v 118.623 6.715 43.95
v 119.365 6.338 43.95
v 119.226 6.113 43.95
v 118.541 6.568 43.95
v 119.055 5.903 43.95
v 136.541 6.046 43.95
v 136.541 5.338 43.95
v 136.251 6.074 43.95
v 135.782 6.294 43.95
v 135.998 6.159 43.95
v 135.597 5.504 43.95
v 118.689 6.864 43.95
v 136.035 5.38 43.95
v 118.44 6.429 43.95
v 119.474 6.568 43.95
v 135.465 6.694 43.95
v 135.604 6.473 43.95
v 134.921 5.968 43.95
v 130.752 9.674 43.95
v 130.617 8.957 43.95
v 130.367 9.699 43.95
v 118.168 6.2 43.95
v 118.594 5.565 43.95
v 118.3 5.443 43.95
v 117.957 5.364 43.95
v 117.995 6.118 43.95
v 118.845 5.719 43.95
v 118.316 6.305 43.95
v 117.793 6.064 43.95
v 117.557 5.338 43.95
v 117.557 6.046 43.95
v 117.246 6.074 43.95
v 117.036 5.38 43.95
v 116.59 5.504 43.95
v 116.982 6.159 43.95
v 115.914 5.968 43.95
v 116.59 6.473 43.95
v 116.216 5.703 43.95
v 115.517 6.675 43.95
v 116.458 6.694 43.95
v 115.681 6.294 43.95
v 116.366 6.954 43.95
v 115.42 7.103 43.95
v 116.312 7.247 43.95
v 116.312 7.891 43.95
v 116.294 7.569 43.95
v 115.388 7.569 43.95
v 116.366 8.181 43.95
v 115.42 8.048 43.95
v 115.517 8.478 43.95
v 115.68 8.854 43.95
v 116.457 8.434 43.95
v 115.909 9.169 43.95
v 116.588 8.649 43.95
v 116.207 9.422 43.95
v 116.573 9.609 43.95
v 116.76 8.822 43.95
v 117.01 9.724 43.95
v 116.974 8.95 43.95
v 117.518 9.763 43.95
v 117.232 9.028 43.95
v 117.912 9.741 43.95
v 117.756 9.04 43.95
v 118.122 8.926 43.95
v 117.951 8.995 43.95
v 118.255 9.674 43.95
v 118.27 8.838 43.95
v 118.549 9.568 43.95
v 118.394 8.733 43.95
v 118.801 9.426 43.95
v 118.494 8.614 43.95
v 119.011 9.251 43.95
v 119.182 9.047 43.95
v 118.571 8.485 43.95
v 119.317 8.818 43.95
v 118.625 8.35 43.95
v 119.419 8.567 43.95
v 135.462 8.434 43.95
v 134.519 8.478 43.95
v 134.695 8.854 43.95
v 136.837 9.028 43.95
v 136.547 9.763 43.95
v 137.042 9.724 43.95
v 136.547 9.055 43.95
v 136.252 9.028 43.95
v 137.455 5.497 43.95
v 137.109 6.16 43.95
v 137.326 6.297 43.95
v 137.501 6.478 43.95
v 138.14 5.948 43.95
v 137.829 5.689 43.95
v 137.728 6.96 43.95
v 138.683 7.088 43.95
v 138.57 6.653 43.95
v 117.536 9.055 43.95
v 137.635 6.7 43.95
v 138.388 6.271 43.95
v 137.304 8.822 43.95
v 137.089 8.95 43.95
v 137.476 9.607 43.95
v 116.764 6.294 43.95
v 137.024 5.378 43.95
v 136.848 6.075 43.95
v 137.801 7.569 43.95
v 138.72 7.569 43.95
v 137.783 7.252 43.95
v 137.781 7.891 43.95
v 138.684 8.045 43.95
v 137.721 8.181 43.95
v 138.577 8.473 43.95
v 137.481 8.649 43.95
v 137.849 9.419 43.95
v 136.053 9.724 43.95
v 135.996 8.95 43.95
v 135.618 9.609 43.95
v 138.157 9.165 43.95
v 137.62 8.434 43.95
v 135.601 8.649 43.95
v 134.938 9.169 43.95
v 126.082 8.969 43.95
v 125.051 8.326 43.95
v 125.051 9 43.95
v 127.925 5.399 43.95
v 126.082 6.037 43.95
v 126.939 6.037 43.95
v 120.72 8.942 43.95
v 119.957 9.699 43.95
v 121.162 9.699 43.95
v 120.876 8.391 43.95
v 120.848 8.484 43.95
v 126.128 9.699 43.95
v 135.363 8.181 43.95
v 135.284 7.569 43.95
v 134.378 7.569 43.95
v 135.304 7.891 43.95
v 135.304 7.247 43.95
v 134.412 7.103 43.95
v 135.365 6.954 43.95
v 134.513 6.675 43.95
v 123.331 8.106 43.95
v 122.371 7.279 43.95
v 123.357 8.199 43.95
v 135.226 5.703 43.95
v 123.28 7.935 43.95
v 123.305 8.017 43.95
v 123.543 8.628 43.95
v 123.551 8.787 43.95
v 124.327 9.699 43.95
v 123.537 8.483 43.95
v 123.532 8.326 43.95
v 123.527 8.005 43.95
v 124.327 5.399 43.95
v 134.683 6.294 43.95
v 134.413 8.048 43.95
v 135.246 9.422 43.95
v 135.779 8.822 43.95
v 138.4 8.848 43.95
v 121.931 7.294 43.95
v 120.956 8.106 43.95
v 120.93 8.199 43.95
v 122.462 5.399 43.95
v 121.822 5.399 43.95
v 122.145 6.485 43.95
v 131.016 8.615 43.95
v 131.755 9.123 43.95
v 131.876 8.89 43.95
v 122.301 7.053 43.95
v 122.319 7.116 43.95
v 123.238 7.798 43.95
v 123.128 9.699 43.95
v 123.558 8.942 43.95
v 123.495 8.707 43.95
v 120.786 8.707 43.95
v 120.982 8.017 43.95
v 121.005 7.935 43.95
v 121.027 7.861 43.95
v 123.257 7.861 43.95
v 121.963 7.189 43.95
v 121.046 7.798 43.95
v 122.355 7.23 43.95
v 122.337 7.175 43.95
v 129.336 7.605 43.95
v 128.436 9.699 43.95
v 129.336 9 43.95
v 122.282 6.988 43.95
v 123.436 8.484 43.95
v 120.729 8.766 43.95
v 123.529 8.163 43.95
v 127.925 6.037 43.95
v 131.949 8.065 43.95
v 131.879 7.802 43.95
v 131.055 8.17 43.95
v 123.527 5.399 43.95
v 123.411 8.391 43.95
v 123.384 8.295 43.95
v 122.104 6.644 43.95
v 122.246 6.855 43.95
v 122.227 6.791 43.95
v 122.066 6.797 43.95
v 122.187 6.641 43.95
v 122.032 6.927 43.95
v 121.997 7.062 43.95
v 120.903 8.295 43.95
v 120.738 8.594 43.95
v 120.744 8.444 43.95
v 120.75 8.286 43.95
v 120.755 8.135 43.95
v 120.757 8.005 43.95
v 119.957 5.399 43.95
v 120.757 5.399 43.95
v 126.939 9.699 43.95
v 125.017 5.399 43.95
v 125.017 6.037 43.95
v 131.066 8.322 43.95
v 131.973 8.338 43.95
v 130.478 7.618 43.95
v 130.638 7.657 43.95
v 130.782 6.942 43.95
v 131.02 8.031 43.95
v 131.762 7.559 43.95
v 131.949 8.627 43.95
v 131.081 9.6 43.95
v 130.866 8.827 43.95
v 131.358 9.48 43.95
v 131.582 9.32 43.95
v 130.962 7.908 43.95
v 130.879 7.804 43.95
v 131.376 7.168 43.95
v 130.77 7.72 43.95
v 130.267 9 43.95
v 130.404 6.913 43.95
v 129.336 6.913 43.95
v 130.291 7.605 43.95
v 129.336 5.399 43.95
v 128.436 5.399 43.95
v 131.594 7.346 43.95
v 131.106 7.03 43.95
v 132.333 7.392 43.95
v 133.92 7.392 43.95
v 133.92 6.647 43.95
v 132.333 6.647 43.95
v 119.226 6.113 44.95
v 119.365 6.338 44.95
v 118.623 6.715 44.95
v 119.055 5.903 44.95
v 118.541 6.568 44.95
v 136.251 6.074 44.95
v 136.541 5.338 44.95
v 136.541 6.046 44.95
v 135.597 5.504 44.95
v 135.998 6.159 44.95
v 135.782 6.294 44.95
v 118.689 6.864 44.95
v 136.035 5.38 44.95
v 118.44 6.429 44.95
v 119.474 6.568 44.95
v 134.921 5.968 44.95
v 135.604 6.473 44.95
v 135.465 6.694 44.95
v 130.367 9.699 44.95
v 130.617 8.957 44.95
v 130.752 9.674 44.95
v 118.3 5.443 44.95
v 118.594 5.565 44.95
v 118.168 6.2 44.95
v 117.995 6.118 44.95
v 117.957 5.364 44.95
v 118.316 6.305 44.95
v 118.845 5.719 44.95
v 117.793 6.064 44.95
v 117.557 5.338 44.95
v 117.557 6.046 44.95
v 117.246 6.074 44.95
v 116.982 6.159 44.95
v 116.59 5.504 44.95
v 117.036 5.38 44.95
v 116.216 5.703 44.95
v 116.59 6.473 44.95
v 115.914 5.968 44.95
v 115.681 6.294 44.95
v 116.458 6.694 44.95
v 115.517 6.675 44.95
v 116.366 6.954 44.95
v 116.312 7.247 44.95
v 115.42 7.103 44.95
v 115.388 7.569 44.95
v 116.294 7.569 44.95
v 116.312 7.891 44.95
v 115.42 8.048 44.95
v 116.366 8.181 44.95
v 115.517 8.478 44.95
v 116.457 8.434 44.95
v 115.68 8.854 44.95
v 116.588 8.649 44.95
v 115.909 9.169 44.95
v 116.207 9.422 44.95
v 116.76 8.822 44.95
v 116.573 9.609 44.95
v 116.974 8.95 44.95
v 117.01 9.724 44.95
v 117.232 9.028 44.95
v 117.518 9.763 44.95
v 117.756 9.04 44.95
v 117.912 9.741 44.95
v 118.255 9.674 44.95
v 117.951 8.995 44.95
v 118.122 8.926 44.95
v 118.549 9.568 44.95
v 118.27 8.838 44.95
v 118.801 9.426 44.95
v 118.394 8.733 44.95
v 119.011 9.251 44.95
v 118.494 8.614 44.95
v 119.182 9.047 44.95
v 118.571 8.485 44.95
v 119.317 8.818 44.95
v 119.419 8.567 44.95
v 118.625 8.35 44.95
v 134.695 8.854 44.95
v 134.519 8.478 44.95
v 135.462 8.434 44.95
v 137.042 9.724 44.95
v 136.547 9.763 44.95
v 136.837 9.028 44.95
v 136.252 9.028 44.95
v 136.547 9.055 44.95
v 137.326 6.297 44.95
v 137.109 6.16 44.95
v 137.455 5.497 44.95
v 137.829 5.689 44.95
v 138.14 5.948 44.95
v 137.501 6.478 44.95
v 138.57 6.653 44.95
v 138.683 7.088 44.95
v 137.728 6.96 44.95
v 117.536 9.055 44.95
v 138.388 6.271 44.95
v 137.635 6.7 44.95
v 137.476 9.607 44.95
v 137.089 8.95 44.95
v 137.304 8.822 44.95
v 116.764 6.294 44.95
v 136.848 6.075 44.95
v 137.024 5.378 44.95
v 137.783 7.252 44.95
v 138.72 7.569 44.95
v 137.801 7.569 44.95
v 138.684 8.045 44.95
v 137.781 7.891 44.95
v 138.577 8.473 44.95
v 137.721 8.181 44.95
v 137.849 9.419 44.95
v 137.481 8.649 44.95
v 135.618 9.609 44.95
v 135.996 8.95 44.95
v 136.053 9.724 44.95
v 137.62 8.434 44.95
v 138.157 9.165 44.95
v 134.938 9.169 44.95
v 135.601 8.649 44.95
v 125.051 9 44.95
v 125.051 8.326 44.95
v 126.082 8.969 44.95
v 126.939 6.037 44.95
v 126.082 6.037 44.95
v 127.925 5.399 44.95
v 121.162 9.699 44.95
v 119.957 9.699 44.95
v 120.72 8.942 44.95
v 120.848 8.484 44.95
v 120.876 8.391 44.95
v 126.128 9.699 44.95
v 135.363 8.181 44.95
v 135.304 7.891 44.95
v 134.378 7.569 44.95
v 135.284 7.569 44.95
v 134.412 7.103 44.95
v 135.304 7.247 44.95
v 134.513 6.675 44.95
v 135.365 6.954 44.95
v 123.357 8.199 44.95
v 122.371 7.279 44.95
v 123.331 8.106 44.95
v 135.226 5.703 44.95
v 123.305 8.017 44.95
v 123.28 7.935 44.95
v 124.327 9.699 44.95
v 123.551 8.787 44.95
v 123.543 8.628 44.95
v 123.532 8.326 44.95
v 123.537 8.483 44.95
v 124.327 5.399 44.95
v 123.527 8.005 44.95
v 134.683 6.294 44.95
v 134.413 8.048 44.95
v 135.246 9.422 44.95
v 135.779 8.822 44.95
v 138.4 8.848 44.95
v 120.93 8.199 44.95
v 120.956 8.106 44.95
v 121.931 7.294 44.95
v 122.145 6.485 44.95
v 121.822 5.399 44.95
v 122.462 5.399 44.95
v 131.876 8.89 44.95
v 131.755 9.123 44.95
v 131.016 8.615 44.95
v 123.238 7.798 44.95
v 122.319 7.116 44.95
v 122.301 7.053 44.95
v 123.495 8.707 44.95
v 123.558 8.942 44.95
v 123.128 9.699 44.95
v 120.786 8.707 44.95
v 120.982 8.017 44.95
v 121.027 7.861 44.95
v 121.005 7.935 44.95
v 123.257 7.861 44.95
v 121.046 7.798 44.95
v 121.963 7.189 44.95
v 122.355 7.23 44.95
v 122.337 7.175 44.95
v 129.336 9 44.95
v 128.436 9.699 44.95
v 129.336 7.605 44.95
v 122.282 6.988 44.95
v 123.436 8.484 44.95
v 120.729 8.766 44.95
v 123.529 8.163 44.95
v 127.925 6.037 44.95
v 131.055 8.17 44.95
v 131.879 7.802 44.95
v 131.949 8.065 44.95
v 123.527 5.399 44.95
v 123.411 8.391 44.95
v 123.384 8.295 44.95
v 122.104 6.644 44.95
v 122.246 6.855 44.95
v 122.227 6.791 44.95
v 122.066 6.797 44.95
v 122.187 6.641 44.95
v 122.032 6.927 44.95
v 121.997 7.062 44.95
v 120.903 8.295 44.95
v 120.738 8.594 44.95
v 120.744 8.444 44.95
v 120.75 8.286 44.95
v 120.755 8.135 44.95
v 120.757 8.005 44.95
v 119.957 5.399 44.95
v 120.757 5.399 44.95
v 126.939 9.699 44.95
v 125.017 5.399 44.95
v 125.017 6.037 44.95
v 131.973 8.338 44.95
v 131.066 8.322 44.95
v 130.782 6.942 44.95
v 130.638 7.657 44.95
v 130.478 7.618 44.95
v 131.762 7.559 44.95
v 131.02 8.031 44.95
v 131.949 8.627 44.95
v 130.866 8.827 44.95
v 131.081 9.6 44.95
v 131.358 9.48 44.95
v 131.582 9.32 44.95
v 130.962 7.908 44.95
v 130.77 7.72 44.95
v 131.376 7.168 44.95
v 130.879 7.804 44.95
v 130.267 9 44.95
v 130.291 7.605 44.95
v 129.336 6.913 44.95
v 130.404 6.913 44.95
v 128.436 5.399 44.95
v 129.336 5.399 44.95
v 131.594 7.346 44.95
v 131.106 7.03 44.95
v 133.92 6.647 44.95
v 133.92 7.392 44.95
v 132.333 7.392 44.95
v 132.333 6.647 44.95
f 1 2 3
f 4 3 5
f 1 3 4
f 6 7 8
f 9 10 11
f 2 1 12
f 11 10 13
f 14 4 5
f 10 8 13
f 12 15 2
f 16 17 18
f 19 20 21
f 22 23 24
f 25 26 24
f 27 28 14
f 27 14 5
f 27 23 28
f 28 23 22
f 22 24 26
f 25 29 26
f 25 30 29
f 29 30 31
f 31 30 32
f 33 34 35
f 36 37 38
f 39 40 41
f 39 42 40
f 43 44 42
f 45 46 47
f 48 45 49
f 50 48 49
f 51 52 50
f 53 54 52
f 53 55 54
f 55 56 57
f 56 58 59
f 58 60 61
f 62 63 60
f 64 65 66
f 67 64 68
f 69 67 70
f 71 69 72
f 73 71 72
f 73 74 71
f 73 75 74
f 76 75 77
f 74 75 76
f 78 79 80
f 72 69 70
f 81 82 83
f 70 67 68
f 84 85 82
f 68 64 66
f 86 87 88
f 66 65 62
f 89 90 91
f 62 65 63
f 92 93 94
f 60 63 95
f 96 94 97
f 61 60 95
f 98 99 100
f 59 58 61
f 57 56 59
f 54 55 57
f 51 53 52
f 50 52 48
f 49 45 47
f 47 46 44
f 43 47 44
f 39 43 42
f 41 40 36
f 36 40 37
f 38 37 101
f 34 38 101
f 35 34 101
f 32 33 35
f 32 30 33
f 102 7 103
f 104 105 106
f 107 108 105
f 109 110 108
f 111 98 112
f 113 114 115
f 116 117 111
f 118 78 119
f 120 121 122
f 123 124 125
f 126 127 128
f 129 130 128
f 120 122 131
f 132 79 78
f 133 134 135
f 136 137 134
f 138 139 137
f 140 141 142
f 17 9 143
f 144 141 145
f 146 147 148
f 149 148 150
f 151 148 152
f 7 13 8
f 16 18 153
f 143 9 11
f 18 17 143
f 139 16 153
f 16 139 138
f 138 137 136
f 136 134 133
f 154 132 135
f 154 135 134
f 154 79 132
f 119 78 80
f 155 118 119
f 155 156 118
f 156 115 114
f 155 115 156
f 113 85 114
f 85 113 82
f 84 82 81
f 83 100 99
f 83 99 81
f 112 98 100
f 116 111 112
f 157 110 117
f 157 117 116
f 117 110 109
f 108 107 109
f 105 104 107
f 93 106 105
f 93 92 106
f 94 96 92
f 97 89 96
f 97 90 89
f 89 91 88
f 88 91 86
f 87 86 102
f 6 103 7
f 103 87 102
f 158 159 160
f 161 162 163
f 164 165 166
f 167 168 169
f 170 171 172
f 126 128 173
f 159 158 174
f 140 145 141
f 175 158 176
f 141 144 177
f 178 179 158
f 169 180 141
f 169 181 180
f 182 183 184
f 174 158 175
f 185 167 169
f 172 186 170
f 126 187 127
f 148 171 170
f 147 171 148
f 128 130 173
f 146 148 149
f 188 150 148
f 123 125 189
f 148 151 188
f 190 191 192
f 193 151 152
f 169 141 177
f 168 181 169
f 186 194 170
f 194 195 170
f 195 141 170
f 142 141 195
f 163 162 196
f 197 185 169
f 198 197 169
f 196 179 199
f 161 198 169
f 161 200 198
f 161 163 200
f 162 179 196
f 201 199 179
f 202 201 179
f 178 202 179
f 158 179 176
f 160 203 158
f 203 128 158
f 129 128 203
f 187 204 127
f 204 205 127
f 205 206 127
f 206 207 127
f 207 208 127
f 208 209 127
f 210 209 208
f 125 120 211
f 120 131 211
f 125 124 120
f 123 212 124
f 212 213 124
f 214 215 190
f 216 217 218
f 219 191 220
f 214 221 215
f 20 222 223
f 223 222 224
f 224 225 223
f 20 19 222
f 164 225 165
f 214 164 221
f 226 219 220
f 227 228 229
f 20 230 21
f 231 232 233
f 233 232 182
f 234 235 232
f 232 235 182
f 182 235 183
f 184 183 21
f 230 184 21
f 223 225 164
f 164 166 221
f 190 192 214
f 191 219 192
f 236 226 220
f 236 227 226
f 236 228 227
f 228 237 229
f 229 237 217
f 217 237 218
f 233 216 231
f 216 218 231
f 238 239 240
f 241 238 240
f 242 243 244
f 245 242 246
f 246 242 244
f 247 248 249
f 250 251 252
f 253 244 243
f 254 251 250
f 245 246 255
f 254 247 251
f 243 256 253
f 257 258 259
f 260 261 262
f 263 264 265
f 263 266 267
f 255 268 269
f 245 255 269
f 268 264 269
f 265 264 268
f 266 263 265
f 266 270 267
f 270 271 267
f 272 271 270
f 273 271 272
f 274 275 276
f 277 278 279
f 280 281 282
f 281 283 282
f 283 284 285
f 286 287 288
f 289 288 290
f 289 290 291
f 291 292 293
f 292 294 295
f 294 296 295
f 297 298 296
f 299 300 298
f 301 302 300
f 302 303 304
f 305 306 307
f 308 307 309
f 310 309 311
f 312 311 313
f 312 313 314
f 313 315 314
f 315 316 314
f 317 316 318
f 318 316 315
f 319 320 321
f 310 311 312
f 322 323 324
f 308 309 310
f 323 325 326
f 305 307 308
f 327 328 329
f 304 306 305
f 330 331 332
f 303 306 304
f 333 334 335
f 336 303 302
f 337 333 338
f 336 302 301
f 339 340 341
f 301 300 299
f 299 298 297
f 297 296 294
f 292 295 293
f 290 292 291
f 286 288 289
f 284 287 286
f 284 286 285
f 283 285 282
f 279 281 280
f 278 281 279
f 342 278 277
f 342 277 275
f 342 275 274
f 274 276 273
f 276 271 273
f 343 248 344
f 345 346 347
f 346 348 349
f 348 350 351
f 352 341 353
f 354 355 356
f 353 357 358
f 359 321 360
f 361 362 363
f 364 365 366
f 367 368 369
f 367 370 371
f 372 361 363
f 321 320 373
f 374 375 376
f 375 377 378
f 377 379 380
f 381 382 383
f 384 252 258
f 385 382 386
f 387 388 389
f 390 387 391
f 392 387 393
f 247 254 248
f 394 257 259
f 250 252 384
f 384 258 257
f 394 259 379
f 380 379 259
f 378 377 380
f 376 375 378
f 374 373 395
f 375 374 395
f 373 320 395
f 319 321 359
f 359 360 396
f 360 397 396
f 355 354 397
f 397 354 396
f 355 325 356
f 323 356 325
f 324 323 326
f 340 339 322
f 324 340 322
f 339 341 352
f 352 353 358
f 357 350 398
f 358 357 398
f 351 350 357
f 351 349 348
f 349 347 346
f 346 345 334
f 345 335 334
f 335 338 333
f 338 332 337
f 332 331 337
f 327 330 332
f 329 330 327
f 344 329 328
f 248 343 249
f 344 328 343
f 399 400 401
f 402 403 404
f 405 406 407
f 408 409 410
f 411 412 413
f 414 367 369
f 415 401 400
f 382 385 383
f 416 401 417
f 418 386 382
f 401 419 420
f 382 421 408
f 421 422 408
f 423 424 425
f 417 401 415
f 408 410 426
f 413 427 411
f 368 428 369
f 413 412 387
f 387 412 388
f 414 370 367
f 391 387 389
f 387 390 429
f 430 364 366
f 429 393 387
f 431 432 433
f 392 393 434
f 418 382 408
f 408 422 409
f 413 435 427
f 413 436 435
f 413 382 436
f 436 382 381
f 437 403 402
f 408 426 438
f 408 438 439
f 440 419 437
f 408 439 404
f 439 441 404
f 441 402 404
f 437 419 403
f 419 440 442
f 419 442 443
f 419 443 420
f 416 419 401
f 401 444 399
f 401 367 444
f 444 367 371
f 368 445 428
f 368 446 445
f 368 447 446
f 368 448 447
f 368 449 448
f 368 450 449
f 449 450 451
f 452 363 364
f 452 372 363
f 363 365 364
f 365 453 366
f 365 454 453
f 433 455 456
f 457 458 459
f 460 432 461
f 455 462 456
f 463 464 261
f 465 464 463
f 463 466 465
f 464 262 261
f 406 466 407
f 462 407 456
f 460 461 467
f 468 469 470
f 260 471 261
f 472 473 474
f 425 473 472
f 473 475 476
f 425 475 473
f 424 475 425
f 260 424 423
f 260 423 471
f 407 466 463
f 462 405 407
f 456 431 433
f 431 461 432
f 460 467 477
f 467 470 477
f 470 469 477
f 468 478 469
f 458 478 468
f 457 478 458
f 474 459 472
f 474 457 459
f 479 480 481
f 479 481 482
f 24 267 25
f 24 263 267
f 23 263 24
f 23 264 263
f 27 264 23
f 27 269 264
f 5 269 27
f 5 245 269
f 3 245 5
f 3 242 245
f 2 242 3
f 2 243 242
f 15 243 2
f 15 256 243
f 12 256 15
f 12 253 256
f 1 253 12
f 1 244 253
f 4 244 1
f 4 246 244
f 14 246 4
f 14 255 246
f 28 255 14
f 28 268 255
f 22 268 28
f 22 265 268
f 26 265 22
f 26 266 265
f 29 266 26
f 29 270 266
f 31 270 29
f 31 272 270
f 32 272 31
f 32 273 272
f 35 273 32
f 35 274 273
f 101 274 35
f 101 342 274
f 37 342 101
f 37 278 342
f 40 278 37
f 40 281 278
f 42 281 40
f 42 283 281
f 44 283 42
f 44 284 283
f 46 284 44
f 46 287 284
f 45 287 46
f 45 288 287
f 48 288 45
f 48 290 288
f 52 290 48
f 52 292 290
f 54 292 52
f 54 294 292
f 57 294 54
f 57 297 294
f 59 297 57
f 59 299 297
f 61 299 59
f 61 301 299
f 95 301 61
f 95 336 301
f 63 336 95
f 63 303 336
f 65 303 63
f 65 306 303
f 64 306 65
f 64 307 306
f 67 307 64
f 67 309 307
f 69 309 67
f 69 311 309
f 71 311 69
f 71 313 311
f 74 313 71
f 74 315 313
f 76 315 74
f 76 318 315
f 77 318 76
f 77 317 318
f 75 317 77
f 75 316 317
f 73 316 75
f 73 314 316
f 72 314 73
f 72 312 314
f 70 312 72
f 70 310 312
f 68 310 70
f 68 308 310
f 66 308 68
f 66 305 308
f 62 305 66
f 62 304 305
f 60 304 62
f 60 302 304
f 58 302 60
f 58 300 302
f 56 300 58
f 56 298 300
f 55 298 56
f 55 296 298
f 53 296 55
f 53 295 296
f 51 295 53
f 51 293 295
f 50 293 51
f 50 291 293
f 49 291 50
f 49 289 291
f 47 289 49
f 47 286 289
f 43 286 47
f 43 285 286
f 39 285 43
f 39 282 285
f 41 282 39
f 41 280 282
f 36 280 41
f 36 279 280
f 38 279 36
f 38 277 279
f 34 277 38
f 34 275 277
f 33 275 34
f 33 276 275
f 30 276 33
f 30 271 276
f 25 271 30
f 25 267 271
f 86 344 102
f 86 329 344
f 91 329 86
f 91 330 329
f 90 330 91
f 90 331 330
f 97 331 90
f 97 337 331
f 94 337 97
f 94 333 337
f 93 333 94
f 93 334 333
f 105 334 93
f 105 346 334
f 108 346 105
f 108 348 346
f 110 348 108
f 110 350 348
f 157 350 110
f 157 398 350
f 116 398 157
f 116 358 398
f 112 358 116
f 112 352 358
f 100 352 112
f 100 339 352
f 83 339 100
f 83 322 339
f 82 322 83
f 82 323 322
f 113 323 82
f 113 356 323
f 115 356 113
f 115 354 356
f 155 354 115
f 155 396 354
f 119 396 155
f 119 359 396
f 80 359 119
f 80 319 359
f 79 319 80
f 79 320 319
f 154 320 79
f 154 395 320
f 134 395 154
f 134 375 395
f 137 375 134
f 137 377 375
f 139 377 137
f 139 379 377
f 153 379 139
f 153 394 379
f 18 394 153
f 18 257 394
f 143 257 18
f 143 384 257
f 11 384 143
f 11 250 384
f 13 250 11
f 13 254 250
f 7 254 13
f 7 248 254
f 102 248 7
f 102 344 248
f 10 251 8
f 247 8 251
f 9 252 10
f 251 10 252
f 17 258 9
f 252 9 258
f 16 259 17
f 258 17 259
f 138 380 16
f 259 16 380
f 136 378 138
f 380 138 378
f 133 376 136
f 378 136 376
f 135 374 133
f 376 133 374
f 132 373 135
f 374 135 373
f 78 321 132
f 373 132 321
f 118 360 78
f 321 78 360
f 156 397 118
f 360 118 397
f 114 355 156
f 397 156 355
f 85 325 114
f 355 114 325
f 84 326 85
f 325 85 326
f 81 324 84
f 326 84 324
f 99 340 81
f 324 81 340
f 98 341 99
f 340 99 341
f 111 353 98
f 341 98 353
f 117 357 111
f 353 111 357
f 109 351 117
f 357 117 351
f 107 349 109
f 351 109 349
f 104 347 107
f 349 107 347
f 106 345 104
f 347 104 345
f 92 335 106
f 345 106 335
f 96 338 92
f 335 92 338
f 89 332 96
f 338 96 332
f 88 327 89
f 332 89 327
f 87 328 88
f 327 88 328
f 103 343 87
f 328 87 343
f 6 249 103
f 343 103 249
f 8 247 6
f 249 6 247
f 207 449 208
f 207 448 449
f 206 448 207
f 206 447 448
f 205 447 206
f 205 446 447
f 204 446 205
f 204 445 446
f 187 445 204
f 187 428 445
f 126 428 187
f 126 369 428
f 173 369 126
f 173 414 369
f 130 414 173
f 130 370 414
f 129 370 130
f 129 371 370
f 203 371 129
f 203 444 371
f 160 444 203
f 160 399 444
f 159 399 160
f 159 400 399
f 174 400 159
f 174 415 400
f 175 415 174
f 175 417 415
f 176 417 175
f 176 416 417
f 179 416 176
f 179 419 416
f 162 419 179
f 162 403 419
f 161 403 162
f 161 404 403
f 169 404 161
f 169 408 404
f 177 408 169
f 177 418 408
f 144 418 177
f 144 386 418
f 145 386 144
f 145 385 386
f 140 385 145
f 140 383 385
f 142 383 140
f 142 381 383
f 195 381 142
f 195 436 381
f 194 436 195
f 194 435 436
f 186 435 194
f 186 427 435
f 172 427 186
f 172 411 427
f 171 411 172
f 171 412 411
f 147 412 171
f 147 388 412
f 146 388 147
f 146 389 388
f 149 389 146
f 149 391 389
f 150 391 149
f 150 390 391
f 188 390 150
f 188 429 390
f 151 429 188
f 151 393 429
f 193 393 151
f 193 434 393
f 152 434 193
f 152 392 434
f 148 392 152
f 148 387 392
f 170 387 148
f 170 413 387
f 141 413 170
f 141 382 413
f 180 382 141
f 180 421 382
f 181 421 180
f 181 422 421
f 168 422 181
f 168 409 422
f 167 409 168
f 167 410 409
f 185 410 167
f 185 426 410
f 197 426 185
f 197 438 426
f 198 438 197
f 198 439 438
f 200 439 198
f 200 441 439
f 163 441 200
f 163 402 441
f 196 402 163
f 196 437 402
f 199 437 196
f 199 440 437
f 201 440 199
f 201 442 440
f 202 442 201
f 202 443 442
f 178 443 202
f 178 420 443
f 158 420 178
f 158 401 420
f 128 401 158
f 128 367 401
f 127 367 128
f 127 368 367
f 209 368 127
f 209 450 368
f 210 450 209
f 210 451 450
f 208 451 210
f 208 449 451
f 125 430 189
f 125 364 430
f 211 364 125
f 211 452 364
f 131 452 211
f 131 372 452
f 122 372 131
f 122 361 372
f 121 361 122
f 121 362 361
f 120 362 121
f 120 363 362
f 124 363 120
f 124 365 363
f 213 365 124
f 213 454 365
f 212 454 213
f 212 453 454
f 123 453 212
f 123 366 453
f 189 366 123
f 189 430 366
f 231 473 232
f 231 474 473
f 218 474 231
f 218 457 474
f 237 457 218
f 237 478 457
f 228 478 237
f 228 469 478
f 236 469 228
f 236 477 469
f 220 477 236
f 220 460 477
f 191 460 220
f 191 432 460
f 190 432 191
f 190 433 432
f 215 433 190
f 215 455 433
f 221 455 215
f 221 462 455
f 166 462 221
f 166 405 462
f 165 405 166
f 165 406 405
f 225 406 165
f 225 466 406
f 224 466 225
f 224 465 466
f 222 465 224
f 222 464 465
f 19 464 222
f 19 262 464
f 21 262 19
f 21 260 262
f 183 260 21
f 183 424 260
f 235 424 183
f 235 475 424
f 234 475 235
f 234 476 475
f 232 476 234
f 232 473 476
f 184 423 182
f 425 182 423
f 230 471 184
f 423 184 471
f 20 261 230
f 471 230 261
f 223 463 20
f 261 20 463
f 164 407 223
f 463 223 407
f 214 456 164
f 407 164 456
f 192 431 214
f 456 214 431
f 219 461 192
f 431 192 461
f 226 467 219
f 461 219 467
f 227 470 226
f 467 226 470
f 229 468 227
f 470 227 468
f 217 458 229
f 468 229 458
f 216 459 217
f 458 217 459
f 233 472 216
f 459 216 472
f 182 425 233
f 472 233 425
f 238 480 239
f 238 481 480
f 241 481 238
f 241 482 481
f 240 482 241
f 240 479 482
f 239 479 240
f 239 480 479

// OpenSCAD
// CM1P-O ID text, engraved 0.5 into the plate's top face (frame as cm1p_k_freecad.py).
translate([127, 7.5, 43.95]) linear_extrude(1) text("CM1P-O", size = 4.5, font = "Liberation Sans:style=Bold", halign = "center", valign = "center");
